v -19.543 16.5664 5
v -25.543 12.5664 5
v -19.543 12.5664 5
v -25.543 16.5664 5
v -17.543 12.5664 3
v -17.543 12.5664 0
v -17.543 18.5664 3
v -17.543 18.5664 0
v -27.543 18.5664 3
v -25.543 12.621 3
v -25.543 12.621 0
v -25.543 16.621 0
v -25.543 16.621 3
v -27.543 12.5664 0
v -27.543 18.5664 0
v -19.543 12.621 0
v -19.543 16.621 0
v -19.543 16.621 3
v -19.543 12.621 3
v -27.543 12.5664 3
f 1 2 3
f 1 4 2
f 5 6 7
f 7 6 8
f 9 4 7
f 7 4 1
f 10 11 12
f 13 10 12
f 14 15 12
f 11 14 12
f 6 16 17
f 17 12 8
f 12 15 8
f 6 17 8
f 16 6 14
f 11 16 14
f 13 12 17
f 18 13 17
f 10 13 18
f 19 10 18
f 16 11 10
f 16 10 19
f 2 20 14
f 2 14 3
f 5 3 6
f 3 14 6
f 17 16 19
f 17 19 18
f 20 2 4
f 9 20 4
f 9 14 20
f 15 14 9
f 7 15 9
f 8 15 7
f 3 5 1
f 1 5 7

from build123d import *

# Parameters (mm, degrees)
F0_W     = 10
F0_H     = 6
F2_DEPTH = 5
F1_W     = 6
F1_H     = 4
F3_DEPTH = 3
F4_SIZE  = 2


with BuildPart() as f2:
    # F0 (on Top) → F2 (new body)
    with BuildSketch(Plane.XY):
        with Locations((-22.542964, 15.566407)):
            Rectangle(F0_W, F0_H)
    extrude(amount=F2_DEPTH)

    # F1 (on face) → F3 (cut)
    with BuildSketch(Plane.XY):
        with Locations((-22.542964, 14.620967)):
            Rectangle(F1_W, F1_H)
    extrude(amount=F3_DEPTH, mode=Mode.SUBTRACT)

    # F4
    f4_edges = [f2.edges().sort_by_distance(p)[0] for p in [
        (-27.542964, 15.566407, 5),
        (-22.542964, 18.566407, 5),
        (-17.542964, 15.566407, 5),
    ]]
    chamfer(f4_edges, length=F4_SIZE)


solid = f2.part
